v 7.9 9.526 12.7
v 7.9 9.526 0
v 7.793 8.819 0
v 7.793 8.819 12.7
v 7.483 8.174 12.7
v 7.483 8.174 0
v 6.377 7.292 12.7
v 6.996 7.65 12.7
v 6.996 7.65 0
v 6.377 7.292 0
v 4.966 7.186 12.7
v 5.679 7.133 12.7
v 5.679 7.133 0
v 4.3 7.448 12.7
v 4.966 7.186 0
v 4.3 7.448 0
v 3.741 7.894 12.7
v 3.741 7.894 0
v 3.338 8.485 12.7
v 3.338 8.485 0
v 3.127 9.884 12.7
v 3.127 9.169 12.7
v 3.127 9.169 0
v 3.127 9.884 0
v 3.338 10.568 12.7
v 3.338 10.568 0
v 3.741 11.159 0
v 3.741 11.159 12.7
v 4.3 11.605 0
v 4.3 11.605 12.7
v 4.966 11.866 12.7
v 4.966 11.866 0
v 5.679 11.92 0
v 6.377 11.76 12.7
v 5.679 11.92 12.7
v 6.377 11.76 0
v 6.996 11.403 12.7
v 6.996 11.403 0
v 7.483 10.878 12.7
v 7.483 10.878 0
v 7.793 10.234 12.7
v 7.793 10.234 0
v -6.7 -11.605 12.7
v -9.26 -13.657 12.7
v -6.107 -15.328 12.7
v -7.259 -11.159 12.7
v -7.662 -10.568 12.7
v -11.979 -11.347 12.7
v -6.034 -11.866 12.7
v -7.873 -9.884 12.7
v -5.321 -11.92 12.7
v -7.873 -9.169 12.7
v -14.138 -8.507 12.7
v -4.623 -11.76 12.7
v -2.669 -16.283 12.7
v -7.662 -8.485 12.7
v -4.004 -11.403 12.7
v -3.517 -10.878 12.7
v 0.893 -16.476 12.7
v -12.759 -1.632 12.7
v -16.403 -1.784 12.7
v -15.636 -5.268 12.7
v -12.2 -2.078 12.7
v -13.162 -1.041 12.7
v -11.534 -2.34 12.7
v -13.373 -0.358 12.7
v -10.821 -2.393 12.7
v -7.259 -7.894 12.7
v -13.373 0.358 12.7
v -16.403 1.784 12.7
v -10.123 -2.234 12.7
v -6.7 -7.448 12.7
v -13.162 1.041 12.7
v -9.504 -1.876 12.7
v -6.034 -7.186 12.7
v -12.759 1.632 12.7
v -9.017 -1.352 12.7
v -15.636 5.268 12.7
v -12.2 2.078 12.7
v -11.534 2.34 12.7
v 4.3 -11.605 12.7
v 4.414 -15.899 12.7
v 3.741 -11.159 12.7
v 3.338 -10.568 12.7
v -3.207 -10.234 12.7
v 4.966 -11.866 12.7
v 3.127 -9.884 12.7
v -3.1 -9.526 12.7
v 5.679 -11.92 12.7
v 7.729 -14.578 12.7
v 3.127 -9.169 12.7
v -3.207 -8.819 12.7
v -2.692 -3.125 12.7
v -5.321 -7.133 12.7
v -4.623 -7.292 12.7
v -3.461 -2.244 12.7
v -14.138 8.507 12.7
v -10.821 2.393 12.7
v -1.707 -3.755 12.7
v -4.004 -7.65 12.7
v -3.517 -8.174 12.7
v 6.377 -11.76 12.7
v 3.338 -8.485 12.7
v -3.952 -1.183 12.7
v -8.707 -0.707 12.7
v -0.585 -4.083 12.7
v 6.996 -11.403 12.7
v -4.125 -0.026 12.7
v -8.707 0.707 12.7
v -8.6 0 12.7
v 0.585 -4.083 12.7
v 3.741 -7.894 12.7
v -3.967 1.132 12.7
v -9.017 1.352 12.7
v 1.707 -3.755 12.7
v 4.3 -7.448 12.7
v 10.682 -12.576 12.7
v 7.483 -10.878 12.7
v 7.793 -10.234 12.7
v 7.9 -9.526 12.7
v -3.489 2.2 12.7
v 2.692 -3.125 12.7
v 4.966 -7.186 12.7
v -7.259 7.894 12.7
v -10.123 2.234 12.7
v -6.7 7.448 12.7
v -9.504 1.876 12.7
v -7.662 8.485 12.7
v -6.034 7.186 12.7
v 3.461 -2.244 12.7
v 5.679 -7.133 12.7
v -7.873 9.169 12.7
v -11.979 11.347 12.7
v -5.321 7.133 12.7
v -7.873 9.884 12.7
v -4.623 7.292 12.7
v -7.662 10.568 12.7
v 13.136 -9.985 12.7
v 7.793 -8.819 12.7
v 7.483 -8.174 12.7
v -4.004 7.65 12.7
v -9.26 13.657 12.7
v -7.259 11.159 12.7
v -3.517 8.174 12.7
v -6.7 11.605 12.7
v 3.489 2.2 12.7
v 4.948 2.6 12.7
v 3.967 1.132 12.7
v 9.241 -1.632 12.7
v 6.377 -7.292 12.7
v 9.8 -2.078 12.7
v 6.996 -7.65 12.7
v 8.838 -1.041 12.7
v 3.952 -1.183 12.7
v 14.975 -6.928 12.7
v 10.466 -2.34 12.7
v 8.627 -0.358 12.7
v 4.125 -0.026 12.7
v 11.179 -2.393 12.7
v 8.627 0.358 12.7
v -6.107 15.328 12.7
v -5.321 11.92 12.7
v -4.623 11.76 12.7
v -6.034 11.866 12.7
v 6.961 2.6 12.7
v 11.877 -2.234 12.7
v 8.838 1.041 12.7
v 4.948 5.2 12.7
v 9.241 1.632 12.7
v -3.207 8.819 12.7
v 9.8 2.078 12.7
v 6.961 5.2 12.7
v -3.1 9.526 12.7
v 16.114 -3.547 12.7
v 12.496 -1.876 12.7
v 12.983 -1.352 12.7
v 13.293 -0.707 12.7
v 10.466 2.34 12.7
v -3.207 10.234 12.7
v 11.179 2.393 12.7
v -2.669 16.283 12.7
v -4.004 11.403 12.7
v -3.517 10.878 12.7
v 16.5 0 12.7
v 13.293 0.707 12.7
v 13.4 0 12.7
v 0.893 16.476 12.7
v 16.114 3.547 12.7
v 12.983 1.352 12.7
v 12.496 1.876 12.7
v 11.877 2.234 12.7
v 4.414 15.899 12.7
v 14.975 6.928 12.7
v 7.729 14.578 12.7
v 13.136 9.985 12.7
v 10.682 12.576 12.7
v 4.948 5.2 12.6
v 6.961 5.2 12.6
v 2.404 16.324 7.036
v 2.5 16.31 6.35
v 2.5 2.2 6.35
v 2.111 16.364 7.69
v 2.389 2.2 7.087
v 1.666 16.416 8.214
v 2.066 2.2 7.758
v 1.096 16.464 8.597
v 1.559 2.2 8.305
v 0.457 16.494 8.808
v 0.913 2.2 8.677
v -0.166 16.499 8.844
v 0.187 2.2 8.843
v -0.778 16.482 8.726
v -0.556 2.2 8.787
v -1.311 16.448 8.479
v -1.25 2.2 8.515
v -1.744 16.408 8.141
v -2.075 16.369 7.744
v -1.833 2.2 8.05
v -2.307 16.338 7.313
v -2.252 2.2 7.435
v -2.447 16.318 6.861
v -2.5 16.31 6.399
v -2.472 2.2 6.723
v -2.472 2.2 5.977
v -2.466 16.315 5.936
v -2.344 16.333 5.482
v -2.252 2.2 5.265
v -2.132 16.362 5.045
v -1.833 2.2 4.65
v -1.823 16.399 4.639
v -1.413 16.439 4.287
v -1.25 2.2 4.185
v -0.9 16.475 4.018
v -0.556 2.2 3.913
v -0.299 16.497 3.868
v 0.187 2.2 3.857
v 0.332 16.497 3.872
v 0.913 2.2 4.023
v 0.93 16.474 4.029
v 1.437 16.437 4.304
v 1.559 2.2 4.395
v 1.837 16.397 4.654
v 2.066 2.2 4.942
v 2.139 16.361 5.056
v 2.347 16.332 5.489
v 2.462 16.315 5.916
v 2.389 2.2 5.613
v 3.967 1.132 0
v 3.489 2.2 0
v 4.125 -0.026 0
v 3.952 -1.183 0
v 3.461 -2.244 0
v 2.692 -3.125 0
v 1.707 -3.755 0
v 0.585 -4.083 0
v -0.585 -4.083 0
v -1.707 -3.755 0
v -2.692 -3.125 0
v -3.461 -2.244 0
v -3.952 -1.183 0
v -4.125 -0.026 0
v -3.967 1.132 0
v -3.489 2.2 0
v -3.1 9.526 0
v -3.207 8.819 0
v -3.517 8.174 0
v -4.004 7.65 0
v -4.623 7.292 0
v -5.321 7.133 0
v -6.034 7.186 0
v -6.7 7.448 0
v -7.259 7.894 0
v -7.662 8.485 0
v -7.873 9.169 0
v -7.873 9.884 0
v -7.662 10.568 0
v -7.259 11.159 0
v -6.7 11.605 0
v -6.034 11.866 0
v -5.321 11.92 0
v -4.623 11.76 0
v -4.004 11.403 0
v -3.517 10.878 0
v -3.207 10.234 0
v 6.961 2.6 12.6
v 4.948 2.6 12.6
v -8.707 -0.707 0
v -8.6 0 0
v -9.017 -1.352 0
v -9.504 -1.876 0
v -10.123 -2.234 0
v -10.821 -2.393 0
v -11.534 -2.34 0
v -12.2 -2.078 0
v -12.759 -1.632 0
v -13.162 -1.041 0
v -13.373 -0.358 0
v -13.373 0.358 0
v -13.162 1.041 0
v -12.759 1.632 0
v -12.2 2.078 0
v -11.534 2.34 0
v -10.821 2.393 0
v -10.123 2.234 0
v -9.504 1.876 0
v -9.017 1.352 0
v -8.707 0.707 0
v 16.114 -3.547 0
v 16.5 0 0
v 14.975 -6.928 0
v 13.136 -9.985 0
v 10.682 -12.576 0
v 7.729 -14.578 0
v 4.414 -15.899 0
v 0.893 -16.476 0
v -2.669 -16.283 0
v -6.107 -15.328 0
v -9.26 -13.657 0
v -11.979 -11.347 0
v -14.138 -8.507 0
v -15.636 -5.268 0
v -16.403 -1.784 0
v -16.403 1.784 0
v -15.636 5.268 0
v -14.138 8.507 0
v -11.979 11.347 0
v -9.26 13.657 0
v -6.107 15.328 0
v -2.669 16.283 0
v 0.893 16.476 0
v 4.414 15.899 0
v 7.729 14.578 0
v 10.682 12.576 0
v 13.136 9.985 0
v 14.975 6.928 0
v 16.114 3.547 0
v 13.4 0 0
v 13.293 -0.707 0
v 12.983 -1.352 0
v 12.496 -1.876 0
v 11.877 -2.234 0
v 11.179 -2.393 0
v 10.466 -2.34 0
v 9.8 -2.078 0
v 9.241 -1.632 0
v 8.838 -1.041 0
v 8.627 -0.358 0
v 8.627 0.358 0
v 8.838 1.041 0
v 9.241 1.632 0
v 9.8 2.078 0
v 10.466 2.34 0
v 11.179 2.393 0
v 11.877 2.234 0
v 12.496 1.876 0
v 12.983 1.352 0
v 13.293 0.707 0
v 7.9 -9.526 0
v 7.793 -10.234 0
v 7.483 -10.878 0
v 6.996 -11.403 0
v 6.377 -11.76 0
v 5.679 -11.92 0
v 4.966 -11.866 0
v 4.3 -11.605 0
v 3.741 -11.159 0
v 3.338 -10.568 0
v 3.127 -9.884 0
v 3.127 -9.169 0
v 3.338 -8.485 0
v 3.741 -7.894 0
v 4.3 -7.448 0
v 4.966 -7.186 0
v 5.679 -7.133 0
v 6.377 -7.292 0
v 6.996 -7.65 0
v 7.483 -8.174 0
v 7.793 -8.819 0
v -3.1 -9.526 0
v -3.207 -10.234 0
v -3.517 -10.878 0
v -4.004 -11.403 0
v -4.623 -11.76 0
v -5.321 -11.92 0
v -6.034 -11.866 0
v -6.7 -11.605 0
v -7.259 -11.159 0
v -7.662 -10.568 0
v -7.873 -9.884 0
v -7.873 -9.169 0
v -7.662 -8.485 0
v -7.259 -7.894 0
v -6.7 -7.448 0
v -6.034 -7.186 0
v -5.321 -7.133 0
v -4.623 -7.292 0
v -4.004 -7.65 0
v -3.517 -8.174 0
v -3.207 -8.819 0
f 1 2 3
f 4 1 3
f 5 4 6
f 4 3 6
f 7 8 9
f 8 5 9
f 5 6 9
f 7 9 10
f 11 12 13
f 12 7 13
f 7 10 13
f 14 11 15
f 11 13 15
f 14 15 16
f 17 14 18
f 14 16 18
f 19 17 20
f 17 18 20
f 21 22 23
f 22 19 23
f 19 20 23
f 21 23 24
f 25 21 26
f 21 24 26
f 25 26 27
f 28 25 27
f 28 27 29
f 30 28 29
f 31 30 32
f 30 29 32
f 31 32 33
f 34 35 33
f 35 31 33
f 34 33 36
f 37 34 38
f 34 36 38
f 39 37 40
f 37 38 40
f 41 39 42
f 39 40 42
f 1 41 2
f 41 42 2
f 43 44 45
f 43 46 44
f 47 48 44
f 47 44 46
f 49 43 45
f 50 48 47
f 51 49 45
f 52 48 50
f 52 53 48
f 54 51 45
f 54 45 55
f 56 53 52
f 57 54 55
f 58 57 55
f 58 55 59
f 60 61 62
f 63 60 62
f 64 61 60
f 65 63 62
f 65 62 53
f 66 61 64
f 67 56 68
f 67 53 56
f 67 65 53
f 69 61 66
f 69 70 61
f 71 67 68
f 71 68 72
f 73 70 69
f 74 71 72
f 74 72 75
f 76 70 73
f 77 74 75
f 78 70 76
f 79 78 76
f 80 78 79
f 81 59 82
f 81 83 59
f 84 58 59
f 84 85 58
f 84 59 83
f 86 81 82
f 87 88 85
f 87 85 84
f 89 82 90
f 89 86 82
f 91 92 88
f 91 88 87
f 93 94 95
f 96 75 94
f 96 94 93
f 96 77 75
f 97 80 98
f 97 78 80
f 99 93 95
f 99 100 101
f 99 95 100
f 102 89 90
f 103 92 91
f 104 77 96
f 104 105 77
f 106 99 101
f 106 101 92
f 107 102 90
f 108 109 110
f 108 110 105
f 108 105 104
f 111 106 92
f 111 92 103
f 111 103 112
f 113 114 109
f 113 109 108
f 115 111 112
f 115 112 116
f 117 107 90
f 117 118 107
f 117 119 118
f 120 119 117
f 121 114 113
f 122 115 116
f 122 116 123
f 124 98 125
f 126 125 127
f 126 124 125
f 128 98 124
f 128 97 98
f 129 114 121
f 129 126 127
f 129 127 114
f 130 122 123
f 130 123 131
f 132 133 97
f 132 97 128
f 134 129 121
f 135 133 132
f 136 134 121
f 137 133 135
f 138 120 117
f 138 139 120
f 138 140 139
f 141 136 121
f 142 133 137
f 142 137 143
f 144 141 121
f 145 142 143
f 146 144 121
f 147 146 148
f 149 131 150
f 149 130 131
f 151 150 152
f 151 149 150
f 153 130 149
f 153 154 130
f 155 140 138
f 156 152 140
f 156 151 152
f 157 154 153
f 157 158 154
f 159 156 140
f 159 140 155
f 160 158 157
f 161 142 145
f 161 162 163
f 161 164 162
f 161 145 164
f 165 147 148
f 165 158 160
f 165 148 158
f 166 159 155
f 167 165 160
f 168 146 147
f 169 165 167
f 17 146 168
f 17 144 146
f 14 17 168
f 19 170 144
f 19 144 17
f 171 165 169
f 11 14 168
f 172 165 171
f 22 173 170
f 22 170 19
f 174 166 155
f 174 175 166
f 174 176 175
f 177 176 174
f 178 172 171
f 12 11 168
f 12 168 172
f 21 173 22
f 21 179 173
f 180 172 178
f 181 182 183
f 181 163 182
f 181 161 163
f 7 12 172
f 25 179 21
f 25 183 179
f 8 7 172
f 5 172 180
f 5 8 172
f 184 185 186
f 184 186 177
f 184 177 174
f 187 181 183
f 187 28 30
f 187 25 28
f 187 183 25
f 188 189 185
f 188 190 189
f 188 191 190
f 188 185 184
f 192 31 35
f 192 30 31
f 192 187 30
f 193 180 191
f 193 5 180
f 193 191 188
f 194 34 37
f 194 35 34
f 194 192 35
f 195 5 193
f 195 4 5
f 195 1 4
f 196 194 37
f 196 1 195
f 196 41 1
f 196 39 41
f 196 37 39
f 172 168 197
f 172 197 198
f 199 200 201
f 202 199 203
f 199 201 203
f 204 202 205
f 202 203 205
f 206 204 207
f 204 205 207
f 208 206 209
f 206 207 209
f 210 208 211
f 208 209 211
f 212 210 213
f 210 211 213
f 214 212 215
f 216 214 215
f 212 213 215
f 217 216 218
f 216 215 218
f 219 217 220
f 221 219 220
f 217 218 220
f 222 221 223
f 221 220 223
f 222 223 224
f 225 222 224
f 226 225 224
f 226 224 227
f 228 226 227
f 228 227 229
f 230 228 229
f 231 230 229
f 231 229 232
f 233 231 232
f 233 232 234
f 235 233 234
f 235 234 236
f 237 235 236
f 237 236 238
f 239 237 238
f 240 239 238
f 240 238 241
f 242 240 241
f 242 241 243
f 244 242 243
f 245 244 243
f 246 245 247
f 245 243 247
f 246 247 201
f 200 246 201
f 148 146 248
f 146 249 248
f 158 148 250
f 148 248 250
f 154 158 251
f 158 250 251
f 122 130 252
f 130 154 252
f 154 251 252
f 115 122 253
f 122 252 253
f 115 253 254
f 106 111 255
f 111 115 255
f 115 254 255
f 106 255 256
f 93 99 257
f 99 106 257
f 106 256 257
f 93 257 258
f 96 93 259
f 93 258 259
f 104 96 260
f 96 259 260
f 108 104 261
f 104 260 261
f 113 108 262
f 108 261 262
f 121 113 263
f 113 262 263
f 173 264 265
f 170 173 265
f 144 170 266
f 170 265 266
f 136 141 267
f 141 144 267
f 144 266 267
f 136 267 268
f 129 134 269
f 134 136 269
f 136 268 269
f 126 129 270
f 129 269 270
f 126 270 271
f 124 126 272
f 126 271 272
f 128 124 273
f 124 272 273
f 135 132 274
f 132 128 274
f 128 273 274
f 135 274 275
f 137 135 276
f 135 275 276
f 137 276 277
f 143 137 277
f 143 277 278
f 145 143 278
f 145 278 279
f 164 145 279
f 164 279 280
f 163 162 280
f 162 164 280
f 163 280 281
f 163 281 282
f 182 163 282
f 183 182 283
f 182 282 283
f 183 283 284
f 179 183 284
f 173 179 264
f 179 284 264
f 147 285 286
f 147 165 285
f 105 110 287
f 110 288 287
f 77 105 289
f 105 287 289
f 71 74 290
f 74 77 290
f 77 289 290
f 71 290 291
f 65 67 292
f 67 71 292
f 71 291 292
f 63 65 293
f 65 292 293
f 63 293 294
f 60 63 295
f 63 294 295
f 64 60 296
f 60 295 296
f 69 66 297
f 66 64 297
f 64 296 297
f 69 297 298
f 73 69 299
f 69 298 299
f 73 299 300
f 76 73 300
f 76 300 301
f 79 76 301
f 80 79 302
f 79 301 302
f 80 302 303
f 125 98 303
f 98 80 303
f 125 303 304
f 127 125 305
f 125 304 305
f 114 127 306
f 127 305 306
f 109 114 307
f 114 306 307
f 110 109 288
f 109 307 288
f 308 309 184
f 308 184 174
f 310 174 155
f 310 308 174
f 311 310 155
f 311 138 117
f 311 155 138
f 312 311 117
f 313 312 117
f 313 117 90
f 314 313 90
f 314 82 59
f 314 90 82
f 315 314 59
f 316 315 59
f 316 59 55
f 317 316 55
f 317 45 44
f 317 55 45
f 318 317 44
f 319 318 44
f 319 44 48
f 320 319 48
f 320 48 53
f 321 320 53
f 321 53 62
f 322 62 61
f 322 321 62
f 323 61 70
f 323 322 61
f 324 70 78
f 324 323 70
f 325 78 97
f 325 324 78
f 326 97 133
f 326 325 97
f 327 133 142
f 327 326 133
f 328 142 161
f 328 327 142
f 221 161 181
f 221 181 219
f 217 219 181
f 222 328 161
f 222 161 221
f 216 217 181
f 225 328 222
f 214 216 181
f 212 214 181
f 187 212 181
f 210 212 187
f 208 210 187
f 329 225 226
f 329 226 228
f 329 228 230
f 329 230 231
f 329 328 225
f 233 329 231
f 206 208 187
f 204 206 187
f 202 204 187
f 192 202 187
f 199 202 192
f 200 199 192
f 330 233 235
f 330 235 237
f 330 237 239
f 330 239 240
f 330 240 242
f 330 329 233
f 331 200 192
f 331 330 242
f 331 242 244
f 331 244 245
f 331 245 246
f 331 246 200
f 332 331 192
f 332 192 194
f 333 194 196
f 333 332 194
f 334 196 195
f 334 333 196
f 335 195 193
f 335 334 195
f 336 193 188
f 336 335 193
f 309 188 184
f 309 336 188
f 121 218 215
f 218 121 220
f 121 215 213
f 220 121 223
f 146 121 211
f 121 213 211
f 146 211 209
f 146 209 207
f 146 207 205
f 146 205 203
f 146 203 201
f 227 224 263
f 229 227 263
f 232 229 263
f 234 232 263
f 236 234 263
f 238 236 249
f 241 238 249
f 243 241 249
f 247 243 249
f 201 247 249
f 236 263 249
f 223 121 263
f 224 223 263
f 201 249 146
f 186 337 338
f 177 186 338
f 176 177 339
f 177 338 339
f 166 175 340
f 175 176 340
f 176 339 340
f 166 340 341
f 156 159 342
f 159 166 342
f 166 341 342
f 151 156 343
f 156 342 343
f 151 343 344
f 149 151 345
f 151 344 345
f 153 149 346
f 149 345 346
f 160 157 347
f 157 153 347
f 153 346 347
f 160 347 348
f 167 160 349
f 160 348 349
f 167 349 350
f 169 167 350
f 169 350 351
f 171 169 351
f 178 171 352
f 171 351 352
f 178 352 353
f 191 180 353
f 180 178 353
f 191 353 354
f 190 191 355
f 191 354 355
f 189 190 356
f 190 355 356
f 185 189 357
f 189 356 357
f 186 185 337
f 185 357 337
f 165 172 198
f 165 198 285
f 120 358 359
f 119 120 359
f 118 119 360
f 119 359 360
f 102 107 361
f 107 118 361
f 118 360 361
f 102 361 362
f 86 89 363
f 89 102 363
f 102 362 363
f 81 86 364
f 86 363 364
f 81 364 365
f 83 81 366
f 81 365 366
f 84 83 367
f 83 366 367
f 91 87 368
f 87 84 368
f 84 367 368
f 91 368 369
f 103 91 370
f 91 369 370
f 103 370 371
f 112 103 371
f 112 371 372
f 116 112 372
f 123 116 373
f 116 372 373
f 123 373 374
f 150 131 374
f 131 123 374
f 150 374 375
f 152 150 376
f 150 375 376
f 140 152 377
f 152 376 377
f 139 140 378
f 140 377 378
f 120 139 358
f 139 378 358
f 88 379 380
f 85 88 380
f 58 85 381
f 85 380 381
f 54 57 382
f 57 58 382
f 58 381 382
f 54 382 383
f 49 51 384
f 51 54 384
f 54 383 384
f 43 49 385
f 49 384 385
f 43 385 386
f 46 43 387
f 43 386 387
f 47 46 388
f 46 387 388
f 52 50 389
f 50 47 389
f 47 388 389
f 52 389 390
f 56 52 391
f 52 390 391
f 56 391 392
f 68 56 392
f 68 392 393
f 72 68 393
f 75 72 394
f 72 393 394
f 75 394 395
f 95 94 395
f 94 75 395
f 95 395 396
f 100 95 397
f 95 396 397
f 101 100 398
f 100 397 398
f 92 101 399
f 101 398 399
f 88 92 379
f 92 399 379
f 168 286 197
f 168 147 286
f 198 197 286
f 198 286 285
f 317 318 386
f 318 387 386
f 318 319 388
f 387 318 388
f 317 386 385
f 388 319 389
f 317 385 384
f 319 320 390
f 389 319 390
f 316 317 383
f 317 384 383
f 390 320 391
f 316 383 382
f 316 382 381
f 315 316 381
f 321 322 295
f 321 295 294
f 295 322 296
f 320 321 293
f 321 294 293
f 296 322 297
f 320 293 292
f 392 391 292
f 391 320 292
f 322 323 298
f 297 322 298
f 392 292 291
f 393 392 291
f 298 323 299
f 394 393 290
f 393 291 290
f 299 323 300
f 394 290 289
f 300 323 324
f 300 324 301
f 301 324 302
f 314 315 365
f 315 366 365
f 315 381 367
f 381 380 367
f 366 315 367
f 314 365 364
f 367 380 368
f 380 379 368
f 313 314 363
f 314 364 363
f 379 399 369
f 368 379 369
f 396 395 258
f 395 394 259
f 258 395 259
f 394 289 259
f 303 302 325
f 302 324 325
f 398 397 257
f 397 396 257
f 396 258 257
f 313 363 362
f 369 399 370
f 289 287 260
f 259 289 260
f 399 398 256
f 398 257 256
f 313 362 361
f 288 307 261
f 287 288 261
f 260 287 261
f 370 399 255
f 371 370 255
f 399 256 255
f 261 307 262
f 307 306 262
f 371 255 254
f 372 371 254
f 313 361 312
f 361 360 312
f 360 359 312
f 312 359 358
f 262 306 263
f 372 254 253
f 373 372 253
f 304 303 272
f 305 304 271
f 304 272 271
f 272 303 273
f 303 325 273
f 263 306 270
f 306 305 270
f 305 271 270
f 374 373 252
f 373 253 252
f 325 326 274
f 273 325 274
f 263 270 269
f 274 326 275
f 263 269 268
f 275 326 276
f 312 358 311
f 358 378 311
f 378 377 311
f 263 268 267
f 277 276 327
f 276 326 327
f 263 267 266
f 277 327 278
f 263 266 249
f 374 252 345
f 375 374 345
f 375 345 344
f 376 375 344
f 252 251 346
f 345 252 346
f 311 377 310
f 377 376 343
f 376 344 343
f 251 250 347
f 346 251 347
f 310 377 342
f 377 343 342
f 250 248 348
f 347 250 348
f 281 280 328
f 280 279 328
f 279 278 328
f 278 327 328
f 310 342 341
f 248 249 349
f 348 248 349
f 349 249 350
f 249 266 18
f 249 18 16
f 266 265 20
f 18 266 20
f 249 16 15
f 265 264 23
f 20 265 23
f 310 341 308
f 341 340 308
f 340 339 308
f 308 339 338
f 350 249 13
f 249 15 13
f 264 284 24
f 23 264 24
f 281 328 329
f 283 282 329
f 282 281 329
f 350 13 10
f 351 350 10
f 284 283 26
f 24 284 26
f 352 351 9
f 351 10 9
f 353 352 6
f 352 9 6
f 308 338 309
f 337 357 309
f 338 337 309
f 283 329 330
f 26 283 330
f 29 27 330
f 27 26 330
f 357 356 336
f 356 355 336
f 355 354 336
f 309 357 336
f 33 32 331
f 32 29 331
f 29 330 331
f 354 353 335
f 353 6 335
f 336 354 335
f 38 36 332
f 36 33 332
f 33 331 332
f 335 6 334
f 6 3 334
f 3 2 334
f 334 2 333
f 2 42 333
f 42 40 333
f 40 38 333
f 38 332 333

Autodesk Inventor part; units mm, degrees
ref_plane "YZ Plane" through (0, 0, 0) normal (1, 0, 0) x (0, 1, 0)
ref_plane "XZ Plane" through (0, 0, 0) normal (0, 1, 0) x (-1, 0, 0)
ref_plane "XY Plane" through (0, 0, 0) normal (0, 0, 1) x (1, 0, 0)
sketch "Sketch9" plane through (0, 0, 0) normal (0, 0, 1) x (1, 0, 0)
  circle A0 centre (0, 0) radius 4.125 construction
  circle A1 centre (0, 0) radius 16.5
  circle A2 centre (11, 0) radius 2.4
  circle A3 centre (5.5, 9.5263) radius 2.4
  circle A4 centre (-5.5, 9.5263) radius 2.4
  line L0 (-3.4894, 2.2) -> (3.4894, 2.2)
  arc A5 (-3.4894, 2.2) -> (3.4894, 2.2) centre (0, 0) ccw
  circle A6 centre (-11, 0) radius 2.4
  circle A7 centre (-5.5, -9.5263) radius 2.4
  circle A8 centre (5.5, -9.5263) radius 2.4
  dimension "d25" = 8.25
  dimension "d26" = 33
  dimension "d27" = 4.8
  dimension "d31" = 360
  dimension "d33" = 2.2
  dimension "d36" = 11
extrude "Extrusion8" add sketch "Sketch9" along normal blind 12.7
sketch "Sketch10" plane through (-3.4894, 2.2, 0) normal (0, -1, 0) x (1, 0, 0)
  line L0 (6.9787, 0) -> (0, 0) projected
  line L1 (6.9787, 0) -> (6.9787, 12.7) projected
  line L2 (0, 12.7) -> (6.9787, 12.7) projected
  line L3 (0, 0) -> (0, 12.7) projected
  circle A0 centre (3.4894, 6.35) radius 2.5
  point P0 (3.4894, 0)
  point P1 (3.4894, 12.7)
  point P2 (0, 6.35)
  dimension "d37" = 5
extrude "Extrusion9" cut sketch "Sketch10" against normal through all contours A0
sketch "Sketch11" plane through (0, 0, 12.7) normal (0, 0, 1) x (1, 0, 0)
  line L0 (4.9483, 5.1999) -> (6.9612, 5.1999)
  line L1 (6.9612, 5.1999) -> (6.9612, 2.6)
  line L2 (6.9612, 2.6) -> (4.9483, 2.6)
  line L3 (4.9483, 2.6) -> (4.9483, 5.1999)
  point P0 (0, 0)
extrude "Extrusion10" cut sketch "Sketch11" against normal blind 0.1
properties part number "AA057" material "Aluminum 6061"
